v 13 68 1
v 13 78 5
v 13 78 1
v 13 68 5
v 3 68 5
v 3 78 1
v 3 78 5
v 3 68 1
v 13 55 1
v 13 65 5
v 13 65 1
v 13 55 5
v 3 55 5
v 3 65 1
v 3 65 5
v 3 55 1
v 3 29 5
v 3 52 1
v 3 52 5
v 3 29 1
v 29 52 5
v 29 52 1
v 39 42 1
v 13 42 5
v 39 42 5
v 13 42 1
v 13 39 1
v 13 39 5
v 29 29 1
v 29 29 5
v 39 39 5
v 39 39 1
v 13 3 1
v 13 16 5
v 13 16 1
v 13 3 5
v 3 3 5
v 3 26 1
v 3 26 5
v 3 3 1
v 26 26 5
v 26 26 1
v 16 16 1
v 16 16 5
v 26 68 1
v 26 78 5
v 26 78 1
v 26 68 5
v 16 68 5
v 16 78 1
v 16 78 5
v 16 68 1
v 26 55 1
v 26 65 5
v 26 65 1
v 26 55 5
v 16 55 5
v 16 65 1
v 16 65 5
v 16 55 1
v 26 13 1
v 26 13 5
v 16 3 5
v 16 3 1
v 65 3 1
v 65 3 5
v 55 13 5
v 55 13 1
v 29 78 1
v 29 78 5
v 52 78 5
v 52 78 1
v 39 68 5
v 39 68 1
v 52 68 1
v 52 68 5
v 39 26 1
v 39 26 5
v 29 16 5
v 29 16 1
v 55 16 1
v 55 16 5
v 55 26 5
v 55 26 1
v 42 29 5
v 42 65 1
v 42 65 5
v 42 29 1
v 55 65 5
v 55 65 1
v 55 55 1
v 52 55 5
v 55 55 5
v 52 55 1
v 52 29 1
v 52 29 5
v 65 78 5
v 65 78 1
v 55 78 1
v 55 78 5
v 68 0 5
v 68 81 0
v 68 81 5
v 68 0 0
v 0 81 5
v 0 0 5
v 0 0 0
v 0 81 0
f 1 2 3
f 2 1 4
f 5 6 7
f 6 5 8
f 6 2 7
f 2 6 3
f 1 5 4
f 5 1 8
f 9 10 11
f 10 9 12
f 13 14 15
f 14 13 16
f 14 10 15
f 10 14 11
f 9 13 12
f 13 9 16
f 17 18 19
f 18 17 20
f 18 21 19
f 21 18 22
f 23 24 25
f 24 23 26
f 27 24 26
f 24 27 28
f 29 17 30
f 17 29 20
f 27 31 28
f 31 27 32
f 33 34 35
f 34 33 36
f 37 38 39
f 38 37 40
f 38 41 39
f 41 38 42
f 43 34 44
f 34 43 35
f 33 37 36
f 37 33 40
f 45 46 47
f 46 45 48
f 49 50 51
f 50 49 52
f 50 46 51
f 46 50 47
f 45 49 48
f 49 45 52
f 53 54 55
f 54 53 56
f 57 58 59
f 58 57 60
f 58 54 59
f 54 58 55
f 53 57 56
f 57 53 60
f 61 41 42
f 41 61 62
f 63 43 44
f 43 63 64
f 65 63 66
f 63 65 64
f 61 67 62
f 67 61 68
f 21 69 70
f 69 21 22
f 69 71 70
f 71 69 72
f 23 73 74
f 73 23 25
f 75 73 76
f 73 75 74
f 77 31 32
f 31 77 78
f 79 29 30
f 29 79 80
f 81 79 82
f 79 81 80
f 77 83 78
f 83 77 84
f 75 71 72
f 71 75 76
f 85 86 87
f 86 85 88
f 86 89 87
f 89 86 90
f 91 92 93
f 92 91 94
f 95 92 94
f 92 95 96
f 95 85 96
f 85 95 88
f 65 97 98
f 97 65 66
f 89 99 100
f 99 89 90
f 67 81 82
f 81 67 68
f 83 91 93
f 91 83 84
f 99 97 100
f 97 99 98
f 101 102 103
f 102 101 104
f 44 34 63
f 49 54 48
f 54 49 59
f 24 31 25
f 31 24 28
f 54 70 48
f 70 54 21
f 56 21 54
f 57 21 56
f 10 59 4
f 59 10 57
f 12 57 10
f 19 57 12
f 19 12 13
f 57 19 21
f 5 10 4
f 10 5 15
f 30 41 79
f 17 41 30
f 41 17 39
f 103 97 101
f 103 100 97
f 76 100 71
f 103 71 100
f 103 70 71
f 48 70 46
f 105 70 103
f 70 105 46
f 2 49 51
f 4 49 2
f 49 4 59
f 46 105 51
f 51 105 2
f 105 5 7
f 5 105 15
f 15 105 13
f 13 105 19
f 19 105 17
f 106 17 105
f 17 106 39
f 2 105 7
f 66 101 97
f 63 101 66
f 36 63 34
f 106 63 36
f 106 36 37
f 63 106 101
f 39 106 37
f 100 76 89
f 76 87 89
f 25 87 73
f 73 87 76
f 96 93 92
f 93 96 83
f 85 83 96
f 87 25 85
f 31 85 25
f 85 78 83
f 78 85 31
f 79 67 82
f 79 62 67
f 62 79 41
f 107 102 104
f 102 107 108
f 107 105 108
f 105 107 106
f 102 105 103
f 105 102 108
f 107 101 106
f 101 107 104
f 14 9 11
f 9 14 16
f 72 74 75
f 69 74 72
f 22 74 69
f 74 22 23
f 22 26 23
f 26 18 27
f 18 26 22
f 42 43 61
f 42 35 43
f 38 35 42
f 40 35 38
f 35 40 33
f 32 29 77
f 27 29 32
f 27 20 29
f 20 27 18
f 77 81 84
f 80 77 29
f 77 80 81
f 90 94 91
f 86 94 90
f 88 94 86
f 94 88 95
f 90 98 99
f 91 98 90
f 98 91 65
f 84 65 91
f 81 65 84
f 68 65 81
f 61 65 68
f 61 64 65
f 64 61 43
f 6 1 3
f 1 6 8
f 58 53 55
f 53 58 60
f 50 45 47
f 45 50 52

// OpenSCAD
// file: test/output/maze-masked-data.scad
// code generated maze data
columns = 5;
rows = 6;
connections = [
//  [r,c,S,E]
// S = 0, cut South Wall
// E = 0, cut East Wall
// Column: 0;
	[0,0,1,1],
	[1,0,1,1],
	[2,0,0,0],
	[3,0,1,0],
	[4,0,0,0],
	[5,0,1,1],
// Column: 1;
	[0,1,1,1],
	[1,1,1,1],
	[2,1,1,0],
	[3,1,1,0],
	[4,1,0,1],
	[5,1,1,0],
// Column: 2;
	[0,2,0,0],
	[1,2,0,1],
	[2,2,1,1],
	[3,2,0,1],
	[4,2,1,0],
	[5,2,1,0],
// Column: 3;
	[0,3,1,1],
	[1,3,0,0],
	[2,3,0,1],
	[3,3,1,1],
	[4,3,1,0],
	[5,3,1,0],
// Column: 4;
	[0,4,0,1],
	[1,4,0,1],
	[2,4,0,1],
	[3,4,0,1],
	[4,4,0,1],
	[5,4,1,1]
];
// main file
// Author: Mitch Allen
// File: maze.scad

include <test/output/maze-masked-data.scad>

cellSize = 10;
wallSize = 3;
wallCutPadding = 1; // so sliver not left behind when wall cut out
panelSize = cellSize + wallSize;

mazePanelWidth = columns * panelSize + wallSize;
mazePanelHeight = rows * panelSize + wallSize;
mazePanelThickness = 5;
mazeFloorThickness = 1;
// Wall height needs to be large enough to not leave sliver 
// at bottom when cut out
wallHeight = mazePanelThickness * 2;
// Put 25% below zero so it completely goes through panel bottom
wallHeightOffset = 0 - wallHeight / 4;

floorColor = [0,1,0];
wallColor = [0,0,0];

module drawMazePanel() {
    color(wallColor) 
        cube(size = [mazePanelWidth,mazePanelHeight,mazePanelThickness]);
}

module drawMazeFloor() {
    color(floorColor) 
        cube(size = [mazePanelWidth,mazePanelHeight,mazeFloorThickness]);
}

module cutWalls() {
    // subtract cube cells
    for(el = [0:len(connections)-1]) {
        cell = connections[el];
        echo("CELL: ", cell);
        x = cell[0];
        y = cell[1];
        southWall = cell[2];
        eastWall = cell[3];
        
        cx = mazePanelHeight - (panelSize * (x+1));
        cy = wallSize + panelSize * y;
        
        tx = [ cy, cx, wallHeightOffset ];
        translate( tx ) cube( size = [cellSize, cellSize, wallHeight] );
        
        if( southWall == 0) {
            
            // cut south wall
            
            tx = [
                cy, 
                cx - wallCutPadding * 4, 
                wallHeightOffset ];
            
            translate( tx ) cube( size = [
                cellSize, wallSize + wallCutPadding * 2, wallHeight] );
        }
       
        if( eastWall == 0 ) {
            
            // cut east wall
            
            tx = [
                cy + cellSize  - wallCutPadding, 
                cx, 
                wallHeightOffset ];

            translate( tx ) cube( size = [
                wallSize + wallCutPadding * 2, cellSize, wallHeight] );
        }
    }
}

module main() {
    union() {
        difference() {
            drawMazePanel();
            cutWalls();
        }
        drawMazeFloor();
    }
}

main();
